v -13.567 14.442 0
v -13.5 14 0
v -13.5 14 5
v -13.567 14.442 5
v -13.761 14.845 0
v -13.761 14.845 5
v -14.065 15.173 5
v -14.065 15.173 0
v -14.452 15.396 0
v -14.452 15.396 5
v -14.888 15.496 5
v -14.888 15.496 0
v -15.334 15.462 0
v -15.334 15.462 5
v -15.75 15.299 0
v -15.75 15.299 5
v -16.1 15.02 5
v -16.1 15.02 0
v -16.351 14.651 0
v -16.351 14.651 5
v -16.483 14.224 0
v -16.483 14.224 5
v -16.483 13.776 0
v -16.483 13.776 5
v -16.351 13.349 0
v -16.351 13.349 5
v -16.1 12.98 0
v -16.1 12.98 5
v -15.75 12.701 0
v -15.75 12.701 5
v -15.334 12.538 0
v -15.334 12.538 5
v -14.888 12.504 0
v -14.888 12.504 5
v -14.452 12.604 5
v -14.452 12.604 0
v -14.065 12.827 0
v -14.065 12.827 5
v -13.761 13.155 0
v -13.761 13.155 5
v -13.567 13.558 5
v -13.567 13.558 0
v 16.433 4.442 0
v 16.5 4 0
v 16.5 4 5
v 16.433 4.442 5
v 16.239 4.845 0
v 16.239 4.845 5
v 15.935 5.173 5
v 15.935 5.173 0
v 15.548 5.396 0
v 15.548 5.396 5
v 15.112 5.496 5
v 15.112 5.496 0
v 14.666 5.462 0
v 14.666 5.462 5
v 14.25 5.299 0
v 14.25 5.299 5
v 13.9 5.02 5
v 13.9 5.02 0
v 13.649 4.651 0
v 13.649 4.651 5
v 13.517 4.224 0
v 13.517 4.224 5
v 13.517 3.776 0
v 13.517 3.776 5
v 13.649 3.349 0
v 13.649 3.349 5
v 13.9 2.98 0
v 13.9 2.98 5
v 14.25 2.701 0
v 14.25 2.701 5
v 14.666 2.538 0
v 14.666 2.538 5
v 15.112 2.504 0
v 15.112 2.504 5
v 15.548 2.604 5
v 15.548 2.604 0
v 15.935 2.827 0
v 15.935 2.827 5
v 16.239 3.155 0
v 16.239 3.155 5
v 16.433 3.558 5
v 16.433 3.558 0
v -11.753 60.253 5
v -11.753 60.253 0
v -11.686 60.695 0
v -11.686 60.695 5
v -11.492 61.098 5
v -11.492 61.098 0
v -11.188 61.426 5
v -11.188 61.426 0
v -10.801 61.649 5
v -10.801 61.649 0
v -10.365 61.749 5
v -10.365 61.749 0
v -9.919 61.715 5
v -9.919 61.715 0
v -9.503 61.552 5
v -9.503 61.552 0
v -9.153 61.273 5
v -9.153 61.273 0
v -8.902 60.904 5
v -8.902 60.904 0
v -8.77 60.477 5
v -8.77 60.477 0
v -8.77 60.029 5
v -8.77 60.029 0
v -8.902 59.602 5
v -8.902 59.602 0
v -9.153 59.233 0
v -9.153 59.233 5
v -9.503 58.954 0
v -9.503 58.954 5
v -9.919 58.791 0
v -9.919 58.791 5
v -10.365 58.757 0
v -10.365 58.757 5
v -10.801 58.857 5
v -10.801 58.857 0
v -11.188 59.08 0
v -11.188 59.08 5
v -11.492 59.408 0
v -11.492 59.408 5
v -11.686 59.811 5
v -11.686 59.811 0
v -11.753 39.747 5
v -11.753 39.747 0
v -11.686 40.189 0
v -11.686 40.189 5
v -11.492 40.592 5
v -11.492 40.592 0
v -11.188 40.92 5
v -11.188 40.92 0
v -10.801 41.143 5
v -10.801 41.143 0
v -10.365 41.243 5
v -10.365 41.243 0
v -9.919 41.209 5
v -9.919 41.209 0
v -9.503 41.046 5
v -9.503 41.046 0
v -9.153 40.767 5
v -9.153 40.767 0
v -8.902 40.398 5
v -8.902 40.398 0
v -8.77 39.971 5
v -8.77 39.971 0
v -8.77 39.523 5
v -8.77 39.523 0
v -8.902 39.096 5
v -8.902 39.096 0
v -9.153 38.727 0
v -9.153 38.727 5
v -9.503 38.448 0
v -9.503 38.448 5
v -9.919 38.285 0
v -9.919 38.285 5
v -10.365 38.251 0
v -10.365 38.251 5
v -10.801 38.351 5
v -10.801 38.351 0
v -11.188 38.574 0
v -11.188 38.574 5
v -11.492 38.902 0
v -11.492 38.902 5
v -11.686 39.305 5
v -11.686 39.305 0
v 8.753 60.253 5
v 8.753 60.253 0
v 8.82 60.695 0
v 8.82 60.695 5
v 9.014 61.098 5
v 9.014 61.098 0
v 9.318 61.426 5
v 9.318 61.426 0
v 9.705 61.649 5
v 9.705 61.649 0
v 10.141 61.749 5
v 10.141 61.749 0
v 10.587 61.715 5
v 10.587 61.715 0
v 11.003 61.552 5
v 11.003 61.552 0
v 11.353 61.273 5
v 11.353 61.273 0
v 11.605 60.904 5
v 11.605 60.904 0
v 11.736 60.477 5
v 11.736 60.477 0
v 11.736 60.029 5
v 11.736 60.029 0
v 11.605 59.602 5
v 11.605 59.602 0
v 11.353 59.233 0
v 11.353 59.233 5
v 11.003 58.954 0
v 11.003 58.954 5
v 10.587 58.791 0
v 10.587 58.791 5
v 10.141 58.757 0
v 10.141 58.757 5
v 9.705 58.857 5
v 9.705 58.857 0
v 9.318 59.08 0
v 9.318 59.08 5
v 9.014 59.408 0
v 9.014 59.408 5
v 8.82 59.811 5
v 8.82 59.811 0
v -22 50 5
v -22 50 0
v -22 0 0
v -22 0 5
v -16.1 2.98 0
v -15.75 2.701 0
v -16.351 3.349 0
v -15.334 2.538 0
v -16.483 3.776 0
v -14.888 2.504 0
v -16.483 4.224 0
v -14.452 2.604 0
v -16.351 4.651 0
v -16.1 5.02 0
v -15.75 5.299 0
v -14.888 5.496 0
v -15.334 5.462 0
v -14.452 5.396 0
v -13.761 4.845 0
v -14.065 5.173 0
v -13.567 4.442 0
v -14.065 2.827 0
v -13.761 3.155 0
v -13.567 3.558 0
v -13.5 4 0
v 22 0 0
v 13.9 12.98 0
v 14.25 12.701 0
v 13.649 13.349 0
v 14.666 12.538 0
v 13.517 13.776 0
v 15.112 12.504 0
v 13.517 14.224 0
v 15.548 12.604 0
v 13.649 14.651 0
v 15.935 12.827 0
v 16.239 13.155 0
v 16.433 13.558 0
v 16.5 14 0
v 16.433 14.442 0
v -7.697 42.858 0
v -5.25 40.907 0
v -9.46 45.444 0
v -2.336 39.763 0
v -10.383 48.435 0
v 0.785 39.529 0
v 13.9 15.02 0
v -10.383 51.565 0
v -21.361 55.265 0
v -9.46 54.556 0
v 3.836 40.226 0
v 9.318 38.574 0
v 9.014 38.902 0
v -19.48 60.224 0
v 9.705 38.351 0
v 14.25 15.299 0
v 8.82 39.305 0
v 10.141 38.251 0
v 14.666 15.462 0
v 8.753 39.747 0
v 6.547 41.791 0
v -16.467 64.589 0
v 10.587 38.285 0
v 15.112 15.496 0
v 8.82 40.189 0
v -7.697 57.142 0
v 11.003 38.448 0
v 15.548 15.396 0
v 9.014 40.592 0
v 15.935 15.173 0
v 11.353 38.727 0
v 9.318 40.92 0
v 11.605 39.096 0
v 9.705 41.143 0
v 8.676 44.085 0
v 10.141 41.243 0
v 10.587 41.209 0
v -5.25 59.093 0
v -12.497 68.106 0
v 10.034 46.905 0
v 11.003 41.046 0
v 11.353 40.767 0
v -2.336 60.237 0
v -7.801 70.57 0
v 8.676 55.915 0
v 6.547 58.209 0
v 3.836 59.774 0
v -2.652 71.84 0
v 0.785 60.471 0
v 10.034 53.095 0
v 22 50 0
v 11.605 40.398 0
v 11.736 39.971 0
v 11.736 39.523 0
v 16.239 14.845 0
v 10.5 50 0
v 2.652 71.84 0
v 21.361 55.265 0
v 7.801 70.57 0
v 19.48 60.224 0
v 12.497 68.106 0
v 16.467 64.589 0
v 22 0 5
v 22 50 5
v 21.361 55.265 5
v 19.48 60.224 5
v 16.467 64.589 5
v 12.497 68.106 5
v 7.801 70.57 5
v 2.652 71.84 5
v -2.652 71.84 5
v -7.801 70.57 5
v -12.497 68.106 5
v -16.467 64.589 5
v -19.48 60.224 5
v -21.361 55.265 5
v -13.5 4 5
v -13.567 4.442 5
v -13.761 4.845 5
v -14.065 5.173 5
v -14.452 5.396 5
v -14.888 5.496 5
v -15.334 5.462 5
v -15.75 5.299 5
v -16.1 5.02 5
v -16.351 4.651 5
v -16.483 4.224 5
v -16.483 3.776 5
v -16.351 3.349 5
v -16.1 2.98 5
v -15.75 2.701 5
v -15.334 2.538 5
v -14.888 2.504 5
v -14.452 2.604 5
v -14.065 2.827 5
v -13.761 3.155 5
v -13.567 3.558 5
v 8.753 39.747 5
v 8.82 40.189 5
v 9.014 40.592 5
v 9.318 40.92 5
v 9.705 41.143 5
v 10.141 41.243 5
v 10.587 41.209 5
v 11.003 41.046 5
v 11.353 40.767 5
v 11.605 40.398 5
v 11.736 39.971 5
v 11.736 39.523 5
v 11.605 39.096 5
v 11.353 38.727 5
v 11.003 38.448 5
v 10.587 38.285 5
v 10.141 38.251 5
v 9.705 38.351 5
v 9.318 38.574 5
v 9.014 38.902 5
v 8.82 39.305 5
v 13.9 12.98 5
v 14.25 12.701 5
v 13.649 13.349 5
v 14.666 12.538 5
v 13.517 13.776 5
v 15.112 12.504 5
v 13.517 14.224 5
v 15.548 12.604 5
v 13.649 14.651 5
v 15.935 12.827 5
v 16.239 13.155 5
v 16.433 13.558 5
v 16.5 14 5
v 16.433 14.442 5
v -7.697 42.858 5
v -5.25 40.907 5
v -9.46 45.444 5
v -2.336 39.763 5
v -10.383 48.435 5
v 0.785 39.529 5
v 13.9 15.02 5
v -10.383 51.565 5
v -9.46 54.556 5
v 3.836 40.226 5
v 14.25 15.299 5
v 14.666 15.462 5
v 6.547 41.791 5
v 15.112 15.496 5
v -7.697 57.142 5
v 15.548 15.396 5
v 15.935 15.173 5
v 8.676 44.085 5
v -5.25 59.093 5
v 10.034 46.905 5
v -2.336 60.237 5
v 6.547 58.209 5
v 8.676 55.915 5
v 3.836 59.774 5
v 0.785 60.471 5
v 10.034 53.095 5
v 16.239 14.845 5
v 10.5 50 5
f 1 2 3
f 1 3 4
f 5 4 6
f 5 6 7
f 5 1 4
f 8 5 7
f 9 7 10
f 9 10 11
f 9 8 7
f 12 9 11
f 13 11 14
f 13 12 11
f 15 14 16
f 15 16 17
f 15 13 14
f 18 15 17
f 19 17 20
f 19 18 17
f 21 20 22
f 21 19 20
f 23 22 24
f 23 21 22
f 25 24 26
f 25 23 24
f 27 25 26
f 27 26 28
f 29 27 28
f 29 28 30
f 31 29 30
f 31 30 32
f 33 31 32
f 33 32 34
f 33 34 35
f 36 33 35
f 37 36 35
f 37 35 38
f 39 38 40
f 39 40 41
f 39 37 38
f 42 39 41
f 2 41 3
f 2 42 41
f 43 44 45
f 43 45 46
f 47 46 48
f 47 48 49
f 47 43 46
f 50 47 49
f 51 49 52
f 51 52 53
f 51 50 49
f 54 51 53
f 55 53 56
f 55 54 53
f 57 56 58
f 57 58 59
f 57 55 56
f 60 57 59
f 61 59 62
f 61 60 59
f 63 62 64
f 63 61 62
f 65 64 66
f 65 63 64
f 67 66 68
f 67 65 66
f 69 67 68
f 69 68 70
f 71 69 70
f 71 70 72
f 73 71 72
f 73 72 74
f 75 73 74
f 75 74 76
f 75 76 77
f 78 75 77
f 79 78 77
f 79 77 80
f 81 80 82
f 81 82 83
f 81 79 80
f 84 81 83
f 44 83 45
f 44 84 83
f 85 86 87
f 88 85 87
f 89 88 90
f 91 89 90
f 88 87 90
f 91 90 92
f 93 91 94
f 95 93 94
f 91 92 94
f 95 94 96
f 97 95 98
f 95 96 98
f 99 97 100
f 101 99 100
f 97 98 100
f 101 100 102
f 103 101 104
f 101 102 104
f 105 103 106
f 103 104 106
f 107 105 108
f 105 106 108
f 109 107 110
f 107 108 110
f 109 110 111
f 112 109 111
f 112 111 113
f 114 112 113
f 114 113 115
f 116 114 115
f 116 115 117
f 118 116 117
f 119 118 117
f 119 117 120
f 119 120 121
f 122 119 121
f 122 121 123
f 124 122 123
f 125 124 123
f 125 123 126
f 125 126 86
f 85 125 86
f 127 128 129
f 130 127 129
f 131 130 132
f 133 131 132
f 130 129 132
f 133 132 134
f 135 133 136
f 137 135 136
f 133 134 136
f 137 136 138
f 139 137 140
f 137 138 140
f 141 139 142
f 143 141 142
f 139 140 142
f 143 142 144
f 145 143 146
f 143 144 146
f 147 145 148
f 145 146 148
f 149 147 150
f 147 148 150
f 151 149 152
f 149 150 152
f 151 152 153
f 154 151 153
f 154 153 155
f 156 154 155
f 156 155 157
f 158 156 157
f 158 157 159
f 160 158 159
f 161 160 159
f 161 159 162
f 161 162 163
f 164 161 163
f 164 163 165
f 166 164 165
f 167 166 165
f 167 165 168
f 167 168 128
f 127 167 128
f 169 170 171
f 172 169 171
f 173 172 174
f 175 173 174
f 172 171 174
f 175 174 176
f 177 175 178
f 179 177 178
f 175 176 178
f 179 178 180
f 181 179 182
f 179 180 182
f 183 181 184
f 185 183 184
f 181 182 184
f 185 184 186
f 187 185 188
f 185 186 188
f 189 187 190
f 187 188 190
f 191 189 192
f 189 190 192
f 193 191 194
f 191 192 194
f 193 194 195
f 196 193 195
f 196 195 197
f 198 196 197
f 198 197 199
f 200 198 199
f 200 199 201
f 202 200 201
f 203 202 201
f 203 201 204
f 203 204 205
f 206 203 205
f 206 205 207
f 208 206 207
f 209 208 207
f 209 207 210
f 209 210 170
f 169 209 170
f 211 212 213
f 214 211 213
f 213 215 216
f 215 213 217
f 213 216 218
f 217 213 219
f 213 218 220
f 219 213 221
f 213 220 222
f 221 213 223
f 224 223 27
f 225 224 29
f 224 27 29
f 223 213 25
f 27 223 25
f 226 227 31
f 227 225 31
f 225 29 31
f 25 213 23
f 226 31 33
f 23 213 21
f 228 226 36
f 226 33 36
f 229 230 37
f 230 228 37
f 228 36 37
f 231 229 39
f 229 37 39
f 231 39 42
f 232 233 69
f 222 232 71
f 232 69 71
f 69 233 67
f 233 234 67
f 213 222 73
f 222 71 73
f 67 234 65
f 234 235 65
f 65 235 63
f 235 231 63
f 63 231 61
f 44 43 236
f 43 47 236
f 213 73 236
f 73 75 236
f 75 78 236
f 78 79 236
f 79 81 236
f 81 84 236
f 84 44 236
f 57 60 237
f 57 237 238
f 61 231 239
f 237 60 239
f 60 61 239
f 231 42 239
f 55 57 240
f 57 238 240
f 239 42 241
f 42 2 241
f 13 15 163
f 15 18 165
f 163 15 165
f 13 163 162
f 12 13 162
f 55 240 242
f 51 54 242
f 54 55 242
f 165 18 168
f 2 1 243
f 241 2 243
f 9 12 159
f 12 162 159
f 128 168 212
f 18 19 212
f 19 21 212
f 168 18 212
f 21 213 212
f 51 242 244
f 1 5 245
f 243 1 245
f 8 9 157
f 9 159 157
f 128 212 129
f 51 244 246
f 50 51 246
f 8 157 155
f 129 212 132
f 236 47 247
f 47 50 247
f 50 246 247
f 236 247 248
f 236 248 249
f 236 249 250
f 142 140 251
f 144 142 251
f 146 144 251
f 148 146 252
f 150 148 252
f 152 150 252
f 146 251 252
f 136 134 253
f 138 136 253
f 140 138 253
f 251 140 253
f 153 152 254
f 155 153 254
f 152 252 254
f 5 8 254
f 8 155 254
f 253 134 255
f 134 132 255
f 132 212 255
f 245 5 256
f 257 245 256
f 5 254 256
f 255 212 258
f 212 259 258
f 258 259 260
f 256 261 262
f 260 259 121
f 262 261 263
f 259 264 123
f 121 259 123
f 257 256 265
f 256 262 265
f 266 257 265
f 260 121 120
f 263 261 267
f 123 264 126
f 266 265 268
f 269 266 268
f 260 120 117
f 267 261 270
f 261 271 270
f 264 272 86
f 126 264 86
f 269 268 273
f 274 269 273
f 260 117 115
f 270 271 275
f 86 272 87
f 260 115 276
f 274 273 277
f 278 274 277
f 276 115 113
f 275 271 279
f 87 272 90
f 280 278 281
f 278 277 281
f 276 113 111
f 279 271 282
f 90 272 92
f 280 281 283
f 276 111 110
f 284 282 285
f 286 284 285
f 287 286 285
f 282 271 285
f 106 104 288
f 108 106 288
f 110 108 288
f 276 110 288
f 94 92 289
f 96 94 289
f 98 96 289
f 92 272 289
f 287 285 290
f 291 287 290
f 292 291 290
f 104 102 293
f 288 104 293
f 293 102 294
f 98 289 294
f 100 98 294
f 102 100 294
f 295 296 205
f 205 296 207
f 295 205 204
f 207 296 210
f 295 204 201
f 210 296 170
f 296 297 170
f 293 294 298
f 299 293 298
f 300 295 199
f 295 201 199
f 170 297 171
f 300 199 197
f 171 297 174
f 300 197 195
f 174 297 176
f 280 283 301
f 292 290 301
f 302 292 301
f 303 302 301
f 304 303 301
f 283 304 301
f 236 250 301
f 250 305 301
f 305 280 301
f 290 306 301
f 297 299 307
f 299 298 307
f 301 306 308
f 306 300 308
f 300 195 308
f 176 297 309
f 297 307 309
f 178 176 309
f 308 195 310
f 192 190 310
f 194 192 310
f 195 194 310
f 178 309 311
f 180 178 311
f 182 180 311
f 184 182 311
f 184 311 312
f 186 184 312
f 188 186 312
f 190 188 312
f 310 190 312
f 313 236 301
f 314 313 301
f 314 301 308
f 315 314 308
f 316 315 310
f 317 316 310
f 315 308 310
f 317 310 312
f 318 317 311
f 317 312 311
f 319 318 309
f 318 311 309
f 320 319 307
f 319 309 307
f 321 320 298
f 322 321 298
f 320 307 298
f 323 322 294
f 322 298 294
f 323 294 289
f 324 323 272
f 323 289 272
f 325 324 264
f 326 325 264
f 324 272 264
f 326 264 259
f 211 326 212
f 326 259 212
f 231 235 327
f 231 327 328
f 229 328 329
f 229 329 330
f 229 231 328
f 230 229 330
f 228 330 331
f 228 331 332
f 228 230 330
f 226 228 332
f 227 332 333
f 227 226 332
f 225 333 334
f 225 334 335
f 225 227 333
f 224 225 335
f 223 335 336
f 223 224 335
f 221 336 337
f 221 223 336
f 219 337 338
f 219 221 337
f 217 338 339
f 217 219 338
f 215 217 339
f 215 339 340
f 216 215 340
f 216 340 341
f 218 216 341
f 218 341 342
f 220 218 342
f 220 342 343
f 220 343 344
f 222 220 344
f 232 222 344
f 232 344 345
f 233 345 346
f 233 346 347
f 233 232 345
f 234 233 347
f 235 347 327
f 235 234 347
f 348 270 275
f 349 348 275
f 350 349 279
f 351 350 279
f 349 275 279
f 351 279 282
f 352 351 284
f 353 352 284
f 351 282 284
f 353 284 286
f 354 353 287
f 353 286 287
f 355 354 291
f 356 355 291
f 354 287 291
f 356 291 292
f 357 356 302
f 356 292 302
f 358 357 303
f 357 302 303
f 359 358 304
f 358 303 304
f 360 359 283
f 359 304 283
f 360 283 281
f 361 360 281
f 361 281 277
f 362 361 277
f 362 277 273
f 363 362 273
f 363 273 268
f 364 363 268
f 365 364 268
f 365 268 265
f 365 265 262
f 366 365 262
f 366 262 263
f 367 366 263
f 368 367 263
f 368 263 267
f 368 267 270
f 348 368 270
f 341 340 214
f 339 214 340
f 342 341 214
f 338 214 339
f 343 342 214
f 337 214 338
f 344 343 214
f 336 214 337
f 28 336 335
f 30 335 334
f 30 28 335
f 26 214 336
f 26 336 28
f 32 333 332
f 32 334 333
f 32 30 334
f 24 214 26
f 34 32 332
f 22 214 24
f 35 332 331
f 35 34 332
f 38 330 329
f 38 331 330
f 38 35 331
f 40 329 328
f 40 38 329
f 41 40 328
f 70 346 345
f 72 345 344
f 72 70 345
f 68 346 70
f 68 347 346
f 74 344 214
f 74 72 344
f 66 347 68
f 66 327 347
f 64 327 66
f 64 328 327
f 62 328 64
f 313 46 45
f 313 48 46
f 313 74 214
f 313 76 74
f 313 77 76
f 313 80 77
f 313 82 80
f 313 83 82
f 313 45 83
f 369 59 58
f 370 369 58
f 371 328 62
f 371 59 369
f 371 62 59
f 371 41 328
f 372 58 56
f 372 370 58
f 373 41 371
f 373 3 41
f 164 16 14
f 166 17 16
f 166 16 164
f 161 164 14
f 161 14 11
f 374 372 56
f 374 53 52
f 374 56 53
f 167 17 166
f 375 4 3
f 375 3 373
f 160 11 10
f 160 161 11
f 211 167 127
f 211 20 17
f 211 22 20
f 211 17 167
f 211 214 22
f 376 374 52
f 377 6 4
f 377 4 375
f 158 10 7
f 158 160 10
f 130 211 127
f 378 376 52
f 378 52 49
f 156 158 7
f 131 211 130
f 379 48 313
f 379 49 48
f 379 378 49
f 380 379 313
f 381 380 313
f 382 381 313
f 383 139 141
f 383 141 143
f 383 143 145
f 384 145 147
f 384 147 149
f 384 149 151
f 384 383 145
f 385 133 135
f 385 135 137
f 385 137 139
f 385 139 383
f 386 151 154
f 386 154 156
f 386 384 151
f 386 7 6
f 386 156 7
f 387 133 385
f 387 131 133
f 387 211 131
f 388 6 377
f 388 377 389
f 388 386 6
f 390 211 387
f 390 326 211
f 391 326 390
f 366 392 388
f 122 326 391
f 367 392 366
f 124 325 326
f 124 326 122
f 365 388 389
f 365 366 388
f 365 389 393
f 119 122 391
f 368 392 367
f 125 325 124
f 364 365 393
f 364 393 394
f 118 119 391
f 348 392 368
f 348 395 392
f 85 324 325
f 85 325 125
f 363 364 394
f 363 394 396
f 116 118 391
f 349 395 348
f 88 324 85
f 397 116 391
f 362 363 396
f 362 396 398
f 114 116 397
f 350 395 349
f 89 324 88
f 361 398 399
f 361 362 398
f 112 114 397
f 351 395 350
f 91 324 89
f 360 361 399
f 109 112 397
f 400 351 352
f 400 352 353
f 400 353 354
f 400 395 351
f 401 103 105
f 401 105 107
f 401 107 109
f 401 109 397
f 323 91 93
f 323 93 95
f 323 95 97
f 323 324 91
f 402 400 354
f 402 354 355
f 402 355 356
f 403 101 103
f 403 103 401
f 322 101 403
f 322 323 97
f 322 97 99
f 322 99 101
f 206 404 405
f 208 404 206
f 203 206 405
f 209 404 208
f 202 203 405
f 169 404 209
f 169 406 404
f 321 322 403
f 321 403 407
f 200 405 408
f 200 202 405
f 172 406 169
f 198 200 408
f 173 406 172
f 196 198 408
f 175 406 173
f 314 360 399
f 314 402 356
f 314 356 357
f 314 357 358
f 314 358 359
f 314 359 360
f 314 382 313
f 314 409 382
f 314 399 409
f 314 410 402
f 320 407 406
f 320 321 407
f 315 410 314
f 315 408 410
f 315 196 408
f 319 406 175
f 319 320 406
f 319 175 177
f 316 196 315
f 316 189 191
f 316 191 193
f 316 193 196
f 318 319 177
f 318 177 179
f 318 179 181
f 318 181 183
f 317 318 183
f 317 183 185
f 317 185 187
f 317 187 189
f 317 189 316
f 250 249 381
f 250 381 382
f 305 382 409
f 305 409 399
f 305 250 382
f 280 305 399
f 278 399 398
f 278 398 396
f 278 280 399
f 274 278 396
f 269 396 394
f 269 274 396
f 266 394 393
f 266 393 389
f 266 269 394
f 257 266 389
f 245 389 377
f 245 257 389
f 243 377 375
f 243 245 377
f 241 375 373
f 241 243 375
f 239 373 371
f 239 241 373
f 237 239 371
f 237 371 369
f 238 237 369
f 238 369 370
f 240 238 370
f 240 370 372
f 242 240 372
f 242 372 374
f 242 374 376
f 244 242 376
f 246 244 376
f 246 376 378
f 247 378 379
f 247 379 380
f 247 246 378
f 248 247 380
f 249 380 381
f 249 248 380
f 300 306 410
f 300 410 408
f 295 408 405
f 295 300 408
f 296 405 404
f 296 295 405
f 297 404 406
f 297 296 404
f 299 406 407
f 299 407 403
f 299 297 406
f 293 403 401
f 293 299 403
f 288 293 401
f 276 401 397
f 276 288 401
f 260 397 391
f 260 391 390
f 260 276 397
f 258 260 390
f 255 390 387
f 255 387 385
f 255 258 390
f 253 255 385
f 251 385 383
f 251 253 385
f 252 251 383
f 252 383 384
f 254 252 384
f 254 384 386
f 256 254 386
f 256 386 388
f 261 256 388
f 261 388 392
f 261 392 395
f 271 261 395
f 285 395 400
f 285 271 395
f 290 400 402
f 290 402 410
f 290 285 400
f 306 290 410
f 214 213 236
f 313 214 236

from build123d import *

# Parameters (mm, degrees)
SKETCH_1_R          = 1.5
SKETCH_1_R_2        = 10.5
EXTRUDE_1_DEPTH     = 5
SKETCH_2_R          = 1.5
CUT_EXTRUDE_1_DEPTH = 6


with BuildPart() as part:
    # 草图1 → 凸台-拉伸1 (new body)
    with BuildSketch(Plane.XY):
        with BuildLine():
            Line((-22, 0), (22, 0))
            Line((22, 0), (22, 50))
            ThreePointArc((22, 50), (0, 72), (-22, 50))
            Line((-22, 50), (-22, 0))
        make_face()
        with Locations((-15, 14)):
            Circle(SKETCH_1_R, mode=Mode.SUBTRACT)
        with Locations((-15, 4)):
            Circle(SKETCH_1_R, mode=Mode.SUBTRACT)
        with Locations((15, 4)):
            Circle(SKETCH_1_R, mode=Mode.SUBTRACT)
        with Locations((15, 14)):
            Circle(SKETCH_1_R, mode=Mode.SUBTRACT)
        with Locations((0, 50)):
            Circle(SKETCH_1_R_2, mode=Mode.SUBTRACT)
    extrude(amount=EXTRUDE_1_DEPTH)

    # 草图2 → 切除-拉伸1 (cut, through all)
    with BuildSketch(Plane(origin=(0, 0, 0), x_dir=(-1, 0, 0), z_dir=(0, 0, -1))):
        with Locations((10.253048327, 60.253048327)):
            Circle(SKETCH_2_R)
        with Locations((10.253048327, 39.746951673)):
            Circle(SKETCH_2_R)
        with Locations((-10.253048327, 39.746951673)):
            Circle(SKETCH_2_R)
        with Locations((-10.253048327, 60.253048327)):
            Circle(SKETCH_2_R)
    extrude(amount=-CUT_EXTRUDE_1_DEPTH, mode=Mode.SUBTRACT)


solid = part.part
